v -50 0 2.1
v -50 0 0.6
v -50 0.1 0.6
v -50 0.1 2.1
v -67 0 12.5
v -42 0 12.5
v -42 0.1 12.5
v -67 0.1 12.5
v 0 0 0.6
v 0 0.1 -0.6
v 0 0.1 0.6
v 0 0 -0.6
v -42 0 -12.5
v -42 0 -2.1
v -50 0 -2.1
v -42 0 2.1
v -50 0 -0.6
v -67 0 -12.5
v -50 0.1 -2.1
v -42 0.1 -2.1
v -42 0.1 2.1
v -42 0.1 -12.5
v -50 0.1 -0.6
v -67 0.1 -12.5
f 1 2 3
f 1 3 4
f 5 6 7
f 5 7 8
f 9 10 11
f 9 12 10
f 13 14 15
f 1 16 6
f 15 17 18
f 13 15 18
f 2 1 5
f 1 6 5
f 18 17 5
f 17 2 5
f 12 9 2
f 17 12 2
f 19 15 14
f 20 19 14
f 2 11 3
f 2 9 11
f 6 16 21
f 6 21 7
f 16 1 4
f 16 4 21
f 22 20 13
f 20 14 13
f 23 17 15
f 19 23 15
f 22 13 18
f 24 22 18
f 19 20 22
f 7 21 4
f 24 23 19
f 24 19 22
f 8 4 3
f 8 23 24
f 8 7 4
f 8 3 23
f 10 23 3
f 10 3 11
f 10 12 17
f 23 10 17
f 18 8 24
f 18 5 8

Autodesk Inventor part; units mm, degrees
ref_plane "YZ Plane" through (0, 0, 0) normal (1, 0, 0) x (0, 1, 0)
ref_plane "XZ Plane" through (0, 0, 0) normal (0, 1, 0) x (-1, 0, 0)
ref_plane "XY Plane" through (0, 0, 0) normal (0, 0, 1) x (1, 0, 0)
sketch "Sketch1" plane through (0, 0, 0) normal (0, 1, 0) x (-1, 0, 0)
  line L0 (0, 0) -> (0, 0.6)
  line L1 (0, 0.6) -> (50, 0.6)
  line L2 (50, 0.6) -> (50, 2.1)
  line L3 (50, 2.1) -> (42, 2.1)
  line L4 (42, 2.1) -> (42, 12.5)
  line L5 (42, 12.5) -> (67, 12.5)
  line L6 (67, 12.5) -> (67, 0)
  line L7 (67, 0) -> (0, 0)
  line L8 (0, 0) -> (0, -0.6)
  line L9 (0, -0.6) -> (50, -0.6)
  line L10 (50, -0.6) -> (50, -2.1)
  line L11 (50, -2.1) -> (42, -2.1)
  line L12 (42, -2.1) -> (42, -12.5)
  line L13 (42, -12.5) -> (67, -12.5)
  line L14 (67, -12.5) -> (67, 0)
  dimension "d1" = 0.6
  dimension "d2" = 50
  dimension "d3" = 1.5
  dimension "d4" = 12.5
  dimension "d5" = 25
  dimension "d6" = 8
extrude "Extrusion1" add sketch "Sketch1" along normal blind 0.1
